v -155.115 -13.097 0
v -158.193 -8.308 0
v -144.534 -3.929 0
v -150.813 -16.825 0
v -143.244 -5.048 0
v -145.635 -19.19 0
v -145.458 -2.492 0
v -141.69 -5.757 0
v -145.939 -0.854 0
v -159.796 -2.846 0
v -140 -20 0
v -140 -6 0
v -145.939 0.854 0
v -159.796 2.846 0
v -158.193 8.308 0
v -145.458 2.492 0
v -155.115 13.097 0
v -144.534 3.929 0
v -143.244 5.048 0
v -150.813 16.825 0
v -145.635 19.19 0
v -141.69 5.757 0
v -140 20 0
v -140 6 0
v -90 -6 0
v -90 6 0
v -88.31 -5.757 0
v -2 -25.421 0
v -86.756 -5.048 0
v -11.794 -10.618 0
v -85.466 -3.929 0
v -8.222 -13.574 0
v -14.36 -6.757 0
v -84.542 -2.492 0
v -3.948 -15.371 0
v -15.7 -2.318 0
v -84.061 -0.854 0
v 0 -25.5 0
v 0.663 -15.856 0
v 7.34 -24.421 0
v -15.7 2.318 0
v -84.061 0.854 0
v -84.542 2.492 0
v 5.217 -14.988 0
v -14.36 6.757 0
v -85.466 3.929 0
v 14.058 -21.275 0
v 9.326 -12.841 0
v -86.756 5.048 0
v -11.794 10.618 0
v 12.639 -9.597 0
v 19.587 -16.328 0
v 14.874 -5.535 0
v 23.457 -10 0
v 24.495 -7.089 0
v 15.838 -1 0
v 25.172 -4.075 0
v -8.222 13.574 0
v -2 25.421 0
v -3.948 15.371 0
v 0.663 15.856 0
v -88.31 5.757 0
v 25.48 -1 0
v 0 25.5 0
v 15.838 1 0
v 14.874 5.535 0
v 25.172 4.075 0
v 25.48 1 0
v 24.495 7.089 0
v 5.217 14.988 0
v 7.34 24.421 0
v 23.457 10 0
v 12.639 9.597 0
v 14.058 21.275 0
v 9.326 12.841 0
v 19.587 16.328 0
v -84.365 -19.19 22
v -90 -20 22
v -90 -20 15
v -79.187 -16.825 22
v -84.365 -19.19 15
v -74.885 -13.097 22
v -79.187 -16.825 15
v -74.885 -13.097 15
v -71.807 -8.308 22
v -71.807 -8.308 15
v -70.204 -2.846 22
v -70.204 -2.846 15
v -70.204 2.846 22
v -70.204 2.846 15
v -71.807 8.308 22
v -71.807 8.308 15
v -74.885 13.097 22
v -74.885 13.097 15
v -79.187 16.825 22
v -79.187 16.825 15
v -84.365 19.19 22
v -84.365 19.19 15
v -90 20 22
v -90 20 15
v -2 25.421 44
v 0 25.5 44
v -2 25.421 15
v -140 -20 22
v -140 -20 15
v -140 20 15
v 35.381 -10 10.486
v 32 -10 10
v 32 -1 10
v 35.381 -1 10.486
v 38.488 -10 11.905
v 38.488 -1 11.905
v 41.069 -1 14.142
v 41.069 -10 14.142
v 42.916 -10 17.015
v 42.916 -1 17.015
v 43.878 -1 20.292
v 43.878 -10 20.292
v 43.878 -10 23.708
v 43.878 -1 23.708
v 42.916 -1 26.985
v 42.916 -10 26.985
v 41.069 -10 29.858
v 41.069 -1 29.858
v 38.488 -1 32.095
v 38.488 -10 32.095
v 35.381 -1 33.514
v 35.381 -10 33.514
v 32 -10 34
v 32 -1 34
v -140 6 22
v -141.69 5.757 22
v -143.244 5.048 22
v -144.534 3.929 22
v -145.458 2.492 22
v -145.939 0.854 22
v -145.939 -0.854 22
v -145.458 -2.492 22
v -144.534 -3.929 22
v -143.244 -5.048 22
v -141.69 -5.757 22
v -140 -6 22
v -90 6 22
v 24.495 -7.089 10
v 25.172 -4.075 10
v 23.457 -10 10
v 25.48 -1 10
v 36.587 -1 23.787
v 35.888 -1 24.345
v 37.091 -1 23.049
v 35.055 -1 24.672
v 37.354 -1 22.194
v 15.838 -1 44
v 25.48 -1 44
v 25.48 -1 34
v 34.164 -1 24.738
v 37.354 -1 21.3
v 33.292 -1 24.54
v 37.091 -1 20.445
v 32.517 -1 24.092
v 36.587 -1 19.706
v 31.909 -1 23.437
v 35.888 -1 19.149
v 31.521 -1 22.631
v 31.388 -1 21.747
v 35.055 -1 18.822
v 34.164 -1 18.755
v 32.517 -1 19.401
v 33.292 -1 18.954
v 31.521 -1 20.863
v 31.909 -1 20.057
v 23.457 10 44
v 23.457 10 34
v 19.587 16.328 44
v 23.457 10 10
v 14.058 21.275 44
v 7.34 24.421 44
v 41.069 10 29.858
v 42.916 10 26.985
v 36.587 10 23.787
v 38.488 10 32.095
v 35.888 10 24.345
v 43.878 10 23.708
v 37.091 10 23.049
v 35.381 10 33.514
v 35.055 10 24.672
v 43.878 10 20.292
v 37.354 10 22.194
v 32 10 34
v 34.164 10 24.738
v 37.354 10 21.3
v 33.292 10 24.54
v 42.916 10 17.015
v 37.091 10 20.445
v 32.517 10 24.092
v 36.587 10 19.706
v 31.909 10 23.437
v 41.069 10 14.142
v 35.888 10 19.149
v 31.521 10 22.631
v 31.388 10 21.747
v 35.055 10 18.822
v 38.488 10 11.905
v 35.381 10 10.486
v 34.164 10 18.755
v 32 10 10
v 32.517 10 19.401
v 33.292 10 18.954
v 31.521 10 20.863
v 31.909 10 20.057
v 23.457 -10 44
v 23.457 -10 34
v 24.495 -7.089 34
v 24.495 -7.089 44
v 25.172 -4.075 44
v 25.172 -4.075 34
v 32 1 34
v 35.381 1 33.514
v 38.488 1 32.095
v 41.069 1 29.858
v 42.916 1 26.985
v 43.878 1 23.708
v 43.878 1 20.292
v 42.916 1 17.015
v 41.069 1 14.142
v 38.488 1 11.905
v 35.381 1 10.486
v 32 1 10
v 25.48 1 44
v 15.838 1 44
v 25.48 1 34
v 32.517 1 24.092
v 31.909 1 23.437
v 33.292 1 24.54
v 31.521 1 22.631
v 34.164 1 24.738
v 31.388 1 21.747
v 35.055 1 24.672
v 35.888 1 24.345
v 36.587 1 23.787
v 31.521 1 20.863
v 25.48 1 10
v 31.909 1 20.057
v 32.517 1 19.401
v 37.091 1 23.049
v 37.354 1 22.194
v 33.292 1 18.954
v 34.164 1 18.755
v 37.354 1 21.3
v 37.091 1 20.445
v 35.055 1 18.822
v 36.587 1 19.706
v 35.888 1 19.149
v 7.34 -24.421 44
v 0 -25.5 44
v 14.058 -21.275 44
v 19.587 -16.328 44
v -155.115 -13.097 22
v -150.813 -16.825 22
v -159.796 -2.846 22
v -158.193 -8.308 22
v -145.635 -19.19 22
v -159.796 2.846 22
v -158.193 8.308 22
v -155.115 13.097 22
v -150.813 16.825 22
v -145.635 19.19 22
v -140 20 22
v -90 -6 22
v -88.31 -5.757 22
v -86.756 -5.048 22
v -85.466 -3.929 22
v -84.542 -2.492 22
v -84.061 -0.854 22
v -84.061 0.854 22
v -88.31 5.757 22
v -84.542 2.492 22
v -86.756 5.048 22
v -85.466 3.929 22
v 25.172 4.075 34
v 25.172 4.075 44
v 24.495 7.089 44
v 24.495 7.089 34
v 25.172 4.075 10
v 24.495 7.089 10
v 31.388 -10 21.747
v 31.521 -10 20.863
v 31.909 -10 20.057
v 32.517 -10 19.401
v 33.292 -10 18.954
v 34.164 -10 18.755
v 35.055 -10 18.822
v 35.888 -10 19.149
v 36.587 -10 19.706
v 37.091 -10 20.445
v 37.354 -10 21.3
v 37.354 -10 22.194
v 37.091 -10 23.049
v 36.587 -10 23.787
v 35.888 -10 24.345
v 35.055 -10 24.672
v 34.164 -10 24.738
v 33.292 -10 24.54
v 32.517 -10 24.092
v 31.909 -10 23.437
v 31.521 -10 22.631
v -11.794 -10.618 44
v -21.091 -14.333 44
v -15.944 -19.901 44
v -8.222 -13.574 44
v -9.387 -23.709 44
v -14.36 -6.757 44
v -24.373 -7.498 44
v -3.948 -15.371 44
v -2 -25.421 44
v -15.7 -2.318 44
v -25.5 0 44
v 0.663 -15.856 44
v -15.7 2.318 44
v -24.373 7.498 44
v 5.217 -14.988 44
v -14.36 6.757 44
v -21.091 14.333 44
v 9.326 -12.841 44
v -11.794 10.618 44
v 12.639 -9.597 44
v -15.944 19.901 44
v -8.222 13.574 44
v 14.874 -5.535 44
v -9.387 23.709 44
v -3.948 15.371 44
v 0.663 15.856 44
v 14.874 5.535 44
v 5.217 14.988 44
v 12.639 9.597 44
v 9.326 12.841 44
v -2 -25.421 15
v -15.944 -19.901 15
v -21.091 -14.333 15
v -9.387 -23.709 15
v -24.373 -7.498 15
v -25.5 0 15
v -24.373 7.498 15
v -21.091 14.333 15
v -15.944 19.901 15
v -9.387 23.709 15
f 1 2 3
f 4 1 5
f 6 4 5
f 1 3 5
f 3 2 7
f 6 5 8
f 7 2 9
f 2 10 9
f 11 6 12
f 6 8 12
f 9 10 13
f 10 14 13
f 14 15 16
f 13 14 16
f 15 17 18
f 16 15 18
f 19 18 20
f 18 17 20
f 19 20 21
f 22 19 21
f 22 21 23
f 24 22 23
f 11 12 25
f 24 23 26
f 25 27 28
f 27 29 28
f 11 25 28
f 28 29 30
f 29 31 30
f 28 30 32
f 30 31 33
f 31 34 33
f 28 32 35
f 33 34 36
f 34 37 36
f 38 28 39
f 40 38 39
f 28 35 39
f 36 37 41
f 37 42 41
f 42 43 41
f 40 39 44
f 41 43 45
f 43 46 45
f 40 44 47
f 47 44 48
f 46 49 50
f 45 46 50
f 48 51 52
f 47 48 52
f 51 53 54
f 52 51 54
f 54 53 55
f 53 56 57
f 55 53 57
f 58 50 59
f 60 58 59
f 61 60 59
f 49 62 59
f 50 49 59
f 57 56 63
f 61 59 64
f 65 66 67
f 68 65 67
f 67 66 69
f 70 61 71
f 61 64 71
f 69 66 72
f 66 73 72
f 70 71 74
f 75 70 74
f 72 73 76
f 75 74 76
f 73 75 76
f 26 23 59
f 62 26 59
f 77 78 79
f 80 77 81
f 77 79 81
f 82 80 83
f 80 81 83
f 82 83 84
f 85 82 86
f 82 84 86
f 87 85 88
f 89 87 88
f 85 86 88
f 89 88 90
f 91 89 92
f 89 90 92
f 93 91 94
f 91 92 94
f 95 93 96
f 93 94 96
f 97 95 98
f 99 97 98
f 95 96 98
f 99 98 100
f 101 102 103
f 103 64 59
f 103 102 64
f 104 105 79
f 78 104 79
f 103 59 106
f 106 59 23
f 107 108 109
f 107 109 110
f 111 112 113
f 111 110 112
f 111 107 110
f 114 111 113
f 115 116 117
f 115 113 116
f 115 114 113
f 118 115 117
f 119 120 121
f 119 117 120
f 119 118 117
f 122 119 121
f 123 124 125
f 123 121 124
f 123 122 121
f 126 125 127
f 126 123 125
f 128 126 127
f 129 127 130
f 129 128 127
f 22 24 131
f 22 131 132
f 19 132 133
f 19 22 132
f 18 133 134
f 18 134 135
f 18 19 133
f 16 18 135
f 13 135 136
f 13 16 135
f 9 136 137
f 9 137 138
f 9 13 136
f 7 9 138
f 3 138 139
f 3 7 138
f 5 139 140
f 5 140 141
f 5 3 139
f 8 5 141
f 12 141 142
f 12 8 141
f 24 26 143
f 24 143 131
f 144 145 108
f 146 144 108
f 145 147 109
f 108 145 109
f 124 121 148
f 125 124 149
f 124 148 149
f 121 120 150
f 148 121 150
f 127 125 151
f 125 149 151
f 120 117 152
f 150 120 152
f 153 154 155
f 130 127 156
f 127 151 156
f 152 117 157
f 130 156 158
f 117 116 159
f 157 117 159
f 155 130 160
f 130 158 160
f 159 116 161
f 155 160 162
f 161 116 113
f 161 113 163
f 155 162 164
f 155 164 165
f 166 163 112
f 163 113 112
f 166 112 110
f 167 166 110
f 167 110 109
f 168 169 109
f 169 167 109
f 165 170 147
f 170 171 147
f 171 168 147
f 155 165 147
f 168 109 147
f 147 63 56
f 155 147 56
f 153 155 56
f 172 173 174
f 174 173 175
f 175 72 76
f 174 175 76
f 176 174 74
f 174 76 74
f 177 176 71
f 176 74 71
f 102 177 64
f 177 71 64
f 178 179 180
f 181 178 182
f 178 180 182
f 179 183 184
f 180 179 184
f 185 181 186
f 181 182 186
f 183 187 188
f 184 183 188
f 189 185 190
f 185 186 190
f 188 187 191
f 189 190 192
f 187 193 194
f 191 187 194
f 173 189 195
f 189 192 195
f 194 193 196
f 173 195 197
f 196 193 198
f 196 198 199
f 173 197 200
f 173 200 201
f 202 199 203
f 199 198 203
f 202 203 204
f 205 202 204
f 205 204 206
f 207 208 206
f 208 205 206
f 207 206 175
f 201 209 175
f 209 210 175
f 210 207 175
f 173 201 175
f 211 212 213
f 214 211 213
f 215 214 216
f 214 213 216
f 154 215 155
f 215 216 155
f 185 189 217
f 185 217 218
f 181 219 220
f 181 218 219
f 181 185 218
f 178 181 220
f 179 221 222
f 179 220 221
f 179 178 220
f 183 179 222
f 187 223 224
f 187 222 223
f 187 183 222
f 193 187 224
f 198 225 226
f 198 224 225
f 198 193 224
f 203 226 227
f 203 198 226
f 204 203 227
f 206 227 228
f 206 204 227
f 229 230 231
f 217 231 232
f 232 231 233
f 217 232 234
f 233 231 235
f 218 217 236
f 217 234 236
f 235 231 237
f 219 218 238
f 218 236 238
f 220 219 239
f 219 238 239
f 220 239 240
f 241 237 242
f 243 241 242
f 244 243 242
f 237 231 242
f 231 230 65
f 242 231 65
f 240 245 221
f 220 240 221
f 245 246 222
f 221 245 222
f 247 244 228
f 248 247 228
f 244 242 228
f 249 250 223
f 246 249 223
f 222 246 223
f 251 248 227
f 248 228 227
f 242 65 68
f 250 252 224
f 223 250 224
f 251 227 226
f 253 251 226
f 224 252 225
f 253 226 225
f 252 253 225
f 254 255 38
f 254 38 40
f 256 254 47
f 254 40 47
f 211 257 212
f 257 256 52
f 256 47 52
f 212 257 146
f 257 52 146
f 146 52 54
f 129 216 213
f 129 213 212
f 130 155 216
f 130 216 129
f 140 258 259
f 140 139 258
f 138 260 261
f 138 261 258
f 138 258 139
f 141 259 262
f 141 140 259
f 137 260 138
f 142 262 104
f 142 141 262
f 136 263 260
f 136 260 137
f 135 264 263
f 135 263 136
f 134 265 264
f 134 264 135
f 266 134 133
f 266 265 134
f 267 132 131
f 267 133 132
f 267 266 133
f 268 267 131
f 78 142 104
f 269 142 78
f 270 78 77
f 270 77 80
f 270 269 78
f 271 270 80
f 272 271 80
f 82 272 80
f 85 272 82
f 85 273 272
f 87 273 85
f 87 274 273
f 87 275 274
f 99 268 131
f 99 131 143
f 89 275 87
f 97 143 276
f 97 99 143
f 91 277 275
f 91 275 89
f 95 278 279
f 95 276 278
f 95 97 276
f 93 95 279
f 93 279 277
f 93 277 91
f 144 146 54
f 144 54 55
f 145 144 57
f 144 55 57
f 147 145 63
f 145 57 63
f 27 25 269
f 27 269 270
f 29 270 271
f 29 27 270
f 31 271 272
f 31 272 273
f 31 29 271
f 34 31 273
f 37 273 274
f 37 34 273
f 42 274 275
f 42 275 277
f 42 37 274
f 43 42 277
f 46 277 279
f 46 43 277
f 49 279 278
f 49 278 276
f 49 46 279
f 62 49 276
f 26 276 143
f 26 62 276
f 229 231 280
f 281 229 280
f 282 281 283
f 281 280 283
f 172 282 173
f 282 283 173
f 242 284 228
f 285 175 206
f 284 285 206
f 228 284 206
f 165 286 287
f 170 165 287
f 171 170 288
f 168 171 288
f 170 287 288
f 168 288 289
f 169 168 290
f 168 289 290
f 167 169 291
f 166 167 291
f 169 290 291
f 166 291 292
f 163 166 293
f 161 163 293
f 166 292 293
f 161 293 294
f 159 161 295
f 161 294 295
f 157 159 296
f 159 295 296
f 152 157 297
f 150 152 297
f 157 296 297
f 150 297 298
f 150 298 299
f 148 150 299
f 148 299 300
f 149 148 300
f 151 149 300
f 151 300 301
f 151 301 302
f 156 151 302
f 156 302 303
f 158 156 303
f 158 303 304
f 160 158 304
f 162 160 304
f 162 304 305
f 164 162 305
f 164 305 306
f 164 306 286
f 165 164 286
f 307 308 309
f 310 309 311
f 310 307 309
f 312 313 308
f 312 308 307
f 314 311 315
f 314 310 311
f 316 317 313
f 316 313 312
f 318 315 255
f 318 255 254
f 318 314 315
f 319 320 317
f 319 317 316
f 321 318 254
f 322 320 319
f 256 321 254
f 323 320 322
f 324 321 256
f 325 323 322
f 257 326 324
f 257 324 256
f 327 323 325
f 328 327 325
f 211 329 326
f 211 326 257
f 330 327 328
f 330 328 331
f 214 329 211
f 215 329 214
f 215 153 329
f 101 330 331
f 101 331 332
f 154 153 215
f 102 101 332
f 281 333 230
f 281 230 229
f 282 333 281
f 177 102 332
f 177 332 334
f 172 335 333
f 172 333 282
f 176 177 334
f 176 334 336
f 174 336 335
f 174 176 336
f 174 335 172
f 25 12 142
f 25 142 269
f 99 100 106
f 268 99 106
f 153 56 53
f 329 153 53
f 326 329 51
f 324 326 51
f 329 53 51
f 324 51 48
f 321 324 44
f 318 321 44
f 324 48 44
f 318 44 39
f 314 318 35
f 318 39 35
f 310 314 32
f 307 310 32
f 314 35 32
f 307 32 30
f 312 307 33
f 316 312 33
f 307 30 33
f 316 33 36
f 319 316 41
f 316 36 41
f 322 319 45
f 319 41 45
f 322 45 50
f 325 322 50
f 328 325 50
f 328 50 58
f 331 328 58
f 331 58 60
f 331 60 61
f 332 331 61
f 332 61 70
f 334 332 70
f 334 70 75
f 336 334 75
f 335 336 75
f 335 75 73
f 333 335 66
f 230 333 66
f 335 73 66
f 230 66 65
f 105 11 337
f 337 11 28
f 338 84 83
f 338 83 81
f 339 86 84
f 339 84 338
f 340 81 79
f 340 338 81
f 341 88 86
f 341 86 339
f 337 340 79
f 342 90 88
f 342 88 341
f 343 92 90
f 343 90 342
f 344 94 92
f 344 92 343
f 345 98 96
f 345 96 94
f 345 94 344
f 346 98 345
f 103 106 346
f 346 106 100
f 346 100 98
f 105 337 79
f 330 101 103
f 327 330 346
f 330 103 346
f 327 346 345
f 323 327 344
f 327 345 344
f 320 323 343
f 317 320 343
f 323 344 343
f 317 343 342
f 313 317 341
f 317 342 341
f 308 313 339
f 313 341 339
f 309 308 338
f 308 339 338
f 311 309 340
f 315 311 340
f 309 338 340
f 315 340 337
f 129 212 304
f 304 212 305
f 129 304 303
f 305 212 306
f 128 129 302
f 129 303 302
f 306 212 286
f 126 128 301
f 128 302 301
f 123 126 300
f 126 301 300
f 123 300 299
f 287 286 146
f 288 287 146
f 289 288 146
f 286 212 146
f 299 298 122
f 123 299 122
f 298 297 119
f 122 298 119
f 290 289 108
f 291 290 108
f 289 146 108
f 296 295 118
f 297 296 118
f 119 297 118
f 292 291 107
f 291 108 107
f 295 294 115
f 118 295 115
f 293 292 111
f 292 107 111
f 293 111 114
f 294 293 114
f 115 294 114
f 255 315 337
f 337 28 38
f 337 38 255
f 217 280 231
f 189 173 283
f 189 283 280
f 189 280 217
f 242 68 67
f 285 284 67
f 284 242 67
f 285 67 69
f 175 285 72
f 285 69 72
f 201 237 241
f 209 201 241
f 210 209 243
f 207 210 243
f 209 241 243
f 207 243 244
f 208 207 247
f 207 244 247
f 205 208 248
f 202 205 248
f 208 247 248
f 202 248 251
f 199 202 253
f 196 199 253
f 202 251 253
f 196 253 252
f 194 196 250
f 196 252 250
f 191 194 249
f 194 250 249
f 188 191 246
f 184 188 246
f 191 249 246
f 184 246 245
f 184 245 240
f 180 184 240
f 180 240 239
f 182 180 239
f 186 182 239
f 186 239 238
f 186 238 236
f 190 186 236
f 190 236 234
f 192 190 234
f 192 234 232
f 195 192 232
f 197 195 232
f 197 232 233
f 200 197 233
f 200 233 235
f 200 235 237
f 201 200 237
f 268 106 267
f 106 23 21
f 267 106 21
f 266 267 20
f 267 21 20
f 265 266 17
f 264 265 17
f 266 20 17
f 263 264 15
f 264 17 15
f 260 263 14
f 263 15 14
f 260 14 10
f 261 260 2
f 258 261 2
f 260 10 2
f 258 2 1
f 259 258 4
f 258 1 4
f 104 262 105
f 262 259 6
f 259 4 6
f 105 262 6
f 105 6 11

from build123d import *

# Parameters (mm, degrees)
BOSS_EXTRUDE1_DEPTH   = 44
BOSS_EXTRUDE2_DEPTH   = 15
BOSS_EXTRUDE3_DEPTH   = 22
BOSS_EXTRUDE4_START   = 10
BOSS_EXTRUDE4_DEPTH   = 24
FILLET3_RADIUS        = 12
FILLET3_LENGTH        = 9
FILLET4_RADIUS        = 12
FILLET4_LENGTH        = 9
F_6_0MM_DOWEL_HOLE1_D = 6


with BuildPart() as part:
    # Sketch1 → Boss-Extrude1 (new body)
    with BuildSketch(Plane.XY):
        with BuildLine():
            Line((0, 25.5), (-2.000483947, 25.421409559))
            ThreePointArc((-2.000483947, 25.421409559), (-25.5, 0), (-2.000483947, -25.421409559))
            Line((-2.000483947, -25.421409559), (0, -25.5))
            ThreePointArc((0, -25.5), (14.05791592, -21.274985311), (23.457408211, -10))
            ThreePointArc((23.457408211, -10), (24.879246203, -5.592236438), (25.480384612, -1))
            Line((25.480384612, -1), (15.838462678, -1))
            ThreePointArc((15.838462678, -1), (-15.87, 0), (15.838462678, 1))
            Line((15.838462678, 1), (25.480384612, 1))
            ThreePointArc((25.480384612, 1), (24.879246203, 5.592236438), (23.457408211, 10))
            ThreePointArc((23.457408211, 10), (14.05791592, 21.274985311), (0, 25.5))
        make_face()
    extrude(amount=BOSS_EXTRUDE1_DEPTH)

    # Sketch1<3> → Boss-Extrude2 (add)
    with BuildSketch(Plane.XY):
        with BuildLine():
            Line((-2.000483947, 25.421409559), (-140, 20))
            Line((-140, 20), (-90, 20))
            ThreePointArc((-90, 20), (-70, 0), (-90, -20))
            Line((-90, -20), (-140, -20))
            Line((-140, -20), (-2.000483947, -25.421409559))
            ThreePointArc((-2.000483947, -25.421409559), (-25.5, 0), (-2.000483947, 25.421409559))
        make_face()
    extrude(amount=BOSS_EXTRUDE2_DEPTH)

    # Sketch1<4> → Boss-Extrude3 (add)
    with BuildSketch(Plane.XY):
        with BuildLine():
            Line((-140, -20), (-90, -20))
            ThreePointArc((-90, -20), (-70, 0), (-90, 20))
            Line((-90, 20), (-140, 20))
            ThreePointArc((-140, 20), (-160, 0), (-140, -20))
        make_face()
        with BuildLine():
            ThreePointArc((-90, -6), (-84, 0), (-90, 6))
            Line((-90, 6), (-140, 6))
            ThreePointArc((-140, 6), (-146, 0), (-140, -6))
            Line((-140, -6), (-90, -6))
        make_face(mode=Mode.SUBTRACT)
    extrude(amount=BOSS_EXTRUDE3_DEPTH)

    # Sketch1<5> → Boss-Extrude4 (add)
    with BuildSketch(Plane.XY.offset(BOSS_EXTRUDE4_START)):
        with BuildLine():
            Line((44, 10), (23.457408211, 10))
            ThreePointArc((23.457408211, 10), (24.879246203, 5.592236438), (25.480384612, 1))
            Line((25.480384612, 1), (44, 1))
            Line((44, 1), (44, 10))
        make_face()
        with BuildLine():
            ThreePointArc((25.480384612, -1), (24.879246203, -5.592236438), (23.457408211, -10))
            Line((23.457408211, -10), (44, -10))
            Line((44, -10), (44, -1))
            Line((44, -1), (25.480384612, -1))
        make_face()
    extrude(amount=BOSS_EXTRUDE4_DEPTH)

    # Fillet3: full round fillet: the end face becomes a half cylinder, R = half its width
    fillet3_face = Plane((44, 5.5, 22), x_dir=(0, 1, 0), z_dir=(1, 0, 0))  # on the end face: x along it, z out of the body
    fillet3_slab = fillet3_face.offset(-FILLET3_RADIUS / 2) * Box(FILLET3_LENGTH, 2 * FILLET3_RADIUS, FILLET3_RADIUS, mode=Mode.PRIVATE)  # the body's end, R deep
    fillet3_round = Plane((32, 5.5, 22), x_dir=(1, 0, 0), z_dir=(0, 1, 0)) * Cylinder(FILLET3_RADIUS, FILLET3_LENGTH, mode=Mode.PRIVATE)  # its axis R under the face
    add(fillet3_slab - fillet3_round, mode=Mode.SUBTRACT)

    # Fillet4: full round fillet: the end face becomes a half cylinder, R = half its width
    fillet4_face = Plane((44, -5.5, 22), x_dir=(0, -1, 0), z_dir=(1, 0, 0))  # on the end face: x along it, z out of the body
    fillet4_slab = fillet4_face.offset(-FILLET4_RADIUS / 2) * Box(FILLET4_LENGTH, 2 * FILLET4_RADIUS, FILLET4_RADIUS, mode=Mode.PRIVATE)  # the body's end, R deep
    fillet4_round = Plane((32, -5.5, 22), x_dir=(1, 0, 0), z_dir=(0, -1, 0)) * Cylinder(FILLET4_RADIUS, FILLET4_LENGTH, mode=Mode.PRIVATE)  # its axis R under the face
    add(fillet4_slab - fillet4_round, mode=Mode.SUBTRACT)

    # Ø6.0mm Dowel Hole1 (through all)
    with Locations(Plane(origin=(34.387865252, 10, 21.746882561), x_dir=(1, 0, 0), z_dir=(0, 1, 0))):
        with Locations((0, 0)):
            Hole(F_6_0MM_DOWEL_HOLE1_D / 2)


solid = part.part
